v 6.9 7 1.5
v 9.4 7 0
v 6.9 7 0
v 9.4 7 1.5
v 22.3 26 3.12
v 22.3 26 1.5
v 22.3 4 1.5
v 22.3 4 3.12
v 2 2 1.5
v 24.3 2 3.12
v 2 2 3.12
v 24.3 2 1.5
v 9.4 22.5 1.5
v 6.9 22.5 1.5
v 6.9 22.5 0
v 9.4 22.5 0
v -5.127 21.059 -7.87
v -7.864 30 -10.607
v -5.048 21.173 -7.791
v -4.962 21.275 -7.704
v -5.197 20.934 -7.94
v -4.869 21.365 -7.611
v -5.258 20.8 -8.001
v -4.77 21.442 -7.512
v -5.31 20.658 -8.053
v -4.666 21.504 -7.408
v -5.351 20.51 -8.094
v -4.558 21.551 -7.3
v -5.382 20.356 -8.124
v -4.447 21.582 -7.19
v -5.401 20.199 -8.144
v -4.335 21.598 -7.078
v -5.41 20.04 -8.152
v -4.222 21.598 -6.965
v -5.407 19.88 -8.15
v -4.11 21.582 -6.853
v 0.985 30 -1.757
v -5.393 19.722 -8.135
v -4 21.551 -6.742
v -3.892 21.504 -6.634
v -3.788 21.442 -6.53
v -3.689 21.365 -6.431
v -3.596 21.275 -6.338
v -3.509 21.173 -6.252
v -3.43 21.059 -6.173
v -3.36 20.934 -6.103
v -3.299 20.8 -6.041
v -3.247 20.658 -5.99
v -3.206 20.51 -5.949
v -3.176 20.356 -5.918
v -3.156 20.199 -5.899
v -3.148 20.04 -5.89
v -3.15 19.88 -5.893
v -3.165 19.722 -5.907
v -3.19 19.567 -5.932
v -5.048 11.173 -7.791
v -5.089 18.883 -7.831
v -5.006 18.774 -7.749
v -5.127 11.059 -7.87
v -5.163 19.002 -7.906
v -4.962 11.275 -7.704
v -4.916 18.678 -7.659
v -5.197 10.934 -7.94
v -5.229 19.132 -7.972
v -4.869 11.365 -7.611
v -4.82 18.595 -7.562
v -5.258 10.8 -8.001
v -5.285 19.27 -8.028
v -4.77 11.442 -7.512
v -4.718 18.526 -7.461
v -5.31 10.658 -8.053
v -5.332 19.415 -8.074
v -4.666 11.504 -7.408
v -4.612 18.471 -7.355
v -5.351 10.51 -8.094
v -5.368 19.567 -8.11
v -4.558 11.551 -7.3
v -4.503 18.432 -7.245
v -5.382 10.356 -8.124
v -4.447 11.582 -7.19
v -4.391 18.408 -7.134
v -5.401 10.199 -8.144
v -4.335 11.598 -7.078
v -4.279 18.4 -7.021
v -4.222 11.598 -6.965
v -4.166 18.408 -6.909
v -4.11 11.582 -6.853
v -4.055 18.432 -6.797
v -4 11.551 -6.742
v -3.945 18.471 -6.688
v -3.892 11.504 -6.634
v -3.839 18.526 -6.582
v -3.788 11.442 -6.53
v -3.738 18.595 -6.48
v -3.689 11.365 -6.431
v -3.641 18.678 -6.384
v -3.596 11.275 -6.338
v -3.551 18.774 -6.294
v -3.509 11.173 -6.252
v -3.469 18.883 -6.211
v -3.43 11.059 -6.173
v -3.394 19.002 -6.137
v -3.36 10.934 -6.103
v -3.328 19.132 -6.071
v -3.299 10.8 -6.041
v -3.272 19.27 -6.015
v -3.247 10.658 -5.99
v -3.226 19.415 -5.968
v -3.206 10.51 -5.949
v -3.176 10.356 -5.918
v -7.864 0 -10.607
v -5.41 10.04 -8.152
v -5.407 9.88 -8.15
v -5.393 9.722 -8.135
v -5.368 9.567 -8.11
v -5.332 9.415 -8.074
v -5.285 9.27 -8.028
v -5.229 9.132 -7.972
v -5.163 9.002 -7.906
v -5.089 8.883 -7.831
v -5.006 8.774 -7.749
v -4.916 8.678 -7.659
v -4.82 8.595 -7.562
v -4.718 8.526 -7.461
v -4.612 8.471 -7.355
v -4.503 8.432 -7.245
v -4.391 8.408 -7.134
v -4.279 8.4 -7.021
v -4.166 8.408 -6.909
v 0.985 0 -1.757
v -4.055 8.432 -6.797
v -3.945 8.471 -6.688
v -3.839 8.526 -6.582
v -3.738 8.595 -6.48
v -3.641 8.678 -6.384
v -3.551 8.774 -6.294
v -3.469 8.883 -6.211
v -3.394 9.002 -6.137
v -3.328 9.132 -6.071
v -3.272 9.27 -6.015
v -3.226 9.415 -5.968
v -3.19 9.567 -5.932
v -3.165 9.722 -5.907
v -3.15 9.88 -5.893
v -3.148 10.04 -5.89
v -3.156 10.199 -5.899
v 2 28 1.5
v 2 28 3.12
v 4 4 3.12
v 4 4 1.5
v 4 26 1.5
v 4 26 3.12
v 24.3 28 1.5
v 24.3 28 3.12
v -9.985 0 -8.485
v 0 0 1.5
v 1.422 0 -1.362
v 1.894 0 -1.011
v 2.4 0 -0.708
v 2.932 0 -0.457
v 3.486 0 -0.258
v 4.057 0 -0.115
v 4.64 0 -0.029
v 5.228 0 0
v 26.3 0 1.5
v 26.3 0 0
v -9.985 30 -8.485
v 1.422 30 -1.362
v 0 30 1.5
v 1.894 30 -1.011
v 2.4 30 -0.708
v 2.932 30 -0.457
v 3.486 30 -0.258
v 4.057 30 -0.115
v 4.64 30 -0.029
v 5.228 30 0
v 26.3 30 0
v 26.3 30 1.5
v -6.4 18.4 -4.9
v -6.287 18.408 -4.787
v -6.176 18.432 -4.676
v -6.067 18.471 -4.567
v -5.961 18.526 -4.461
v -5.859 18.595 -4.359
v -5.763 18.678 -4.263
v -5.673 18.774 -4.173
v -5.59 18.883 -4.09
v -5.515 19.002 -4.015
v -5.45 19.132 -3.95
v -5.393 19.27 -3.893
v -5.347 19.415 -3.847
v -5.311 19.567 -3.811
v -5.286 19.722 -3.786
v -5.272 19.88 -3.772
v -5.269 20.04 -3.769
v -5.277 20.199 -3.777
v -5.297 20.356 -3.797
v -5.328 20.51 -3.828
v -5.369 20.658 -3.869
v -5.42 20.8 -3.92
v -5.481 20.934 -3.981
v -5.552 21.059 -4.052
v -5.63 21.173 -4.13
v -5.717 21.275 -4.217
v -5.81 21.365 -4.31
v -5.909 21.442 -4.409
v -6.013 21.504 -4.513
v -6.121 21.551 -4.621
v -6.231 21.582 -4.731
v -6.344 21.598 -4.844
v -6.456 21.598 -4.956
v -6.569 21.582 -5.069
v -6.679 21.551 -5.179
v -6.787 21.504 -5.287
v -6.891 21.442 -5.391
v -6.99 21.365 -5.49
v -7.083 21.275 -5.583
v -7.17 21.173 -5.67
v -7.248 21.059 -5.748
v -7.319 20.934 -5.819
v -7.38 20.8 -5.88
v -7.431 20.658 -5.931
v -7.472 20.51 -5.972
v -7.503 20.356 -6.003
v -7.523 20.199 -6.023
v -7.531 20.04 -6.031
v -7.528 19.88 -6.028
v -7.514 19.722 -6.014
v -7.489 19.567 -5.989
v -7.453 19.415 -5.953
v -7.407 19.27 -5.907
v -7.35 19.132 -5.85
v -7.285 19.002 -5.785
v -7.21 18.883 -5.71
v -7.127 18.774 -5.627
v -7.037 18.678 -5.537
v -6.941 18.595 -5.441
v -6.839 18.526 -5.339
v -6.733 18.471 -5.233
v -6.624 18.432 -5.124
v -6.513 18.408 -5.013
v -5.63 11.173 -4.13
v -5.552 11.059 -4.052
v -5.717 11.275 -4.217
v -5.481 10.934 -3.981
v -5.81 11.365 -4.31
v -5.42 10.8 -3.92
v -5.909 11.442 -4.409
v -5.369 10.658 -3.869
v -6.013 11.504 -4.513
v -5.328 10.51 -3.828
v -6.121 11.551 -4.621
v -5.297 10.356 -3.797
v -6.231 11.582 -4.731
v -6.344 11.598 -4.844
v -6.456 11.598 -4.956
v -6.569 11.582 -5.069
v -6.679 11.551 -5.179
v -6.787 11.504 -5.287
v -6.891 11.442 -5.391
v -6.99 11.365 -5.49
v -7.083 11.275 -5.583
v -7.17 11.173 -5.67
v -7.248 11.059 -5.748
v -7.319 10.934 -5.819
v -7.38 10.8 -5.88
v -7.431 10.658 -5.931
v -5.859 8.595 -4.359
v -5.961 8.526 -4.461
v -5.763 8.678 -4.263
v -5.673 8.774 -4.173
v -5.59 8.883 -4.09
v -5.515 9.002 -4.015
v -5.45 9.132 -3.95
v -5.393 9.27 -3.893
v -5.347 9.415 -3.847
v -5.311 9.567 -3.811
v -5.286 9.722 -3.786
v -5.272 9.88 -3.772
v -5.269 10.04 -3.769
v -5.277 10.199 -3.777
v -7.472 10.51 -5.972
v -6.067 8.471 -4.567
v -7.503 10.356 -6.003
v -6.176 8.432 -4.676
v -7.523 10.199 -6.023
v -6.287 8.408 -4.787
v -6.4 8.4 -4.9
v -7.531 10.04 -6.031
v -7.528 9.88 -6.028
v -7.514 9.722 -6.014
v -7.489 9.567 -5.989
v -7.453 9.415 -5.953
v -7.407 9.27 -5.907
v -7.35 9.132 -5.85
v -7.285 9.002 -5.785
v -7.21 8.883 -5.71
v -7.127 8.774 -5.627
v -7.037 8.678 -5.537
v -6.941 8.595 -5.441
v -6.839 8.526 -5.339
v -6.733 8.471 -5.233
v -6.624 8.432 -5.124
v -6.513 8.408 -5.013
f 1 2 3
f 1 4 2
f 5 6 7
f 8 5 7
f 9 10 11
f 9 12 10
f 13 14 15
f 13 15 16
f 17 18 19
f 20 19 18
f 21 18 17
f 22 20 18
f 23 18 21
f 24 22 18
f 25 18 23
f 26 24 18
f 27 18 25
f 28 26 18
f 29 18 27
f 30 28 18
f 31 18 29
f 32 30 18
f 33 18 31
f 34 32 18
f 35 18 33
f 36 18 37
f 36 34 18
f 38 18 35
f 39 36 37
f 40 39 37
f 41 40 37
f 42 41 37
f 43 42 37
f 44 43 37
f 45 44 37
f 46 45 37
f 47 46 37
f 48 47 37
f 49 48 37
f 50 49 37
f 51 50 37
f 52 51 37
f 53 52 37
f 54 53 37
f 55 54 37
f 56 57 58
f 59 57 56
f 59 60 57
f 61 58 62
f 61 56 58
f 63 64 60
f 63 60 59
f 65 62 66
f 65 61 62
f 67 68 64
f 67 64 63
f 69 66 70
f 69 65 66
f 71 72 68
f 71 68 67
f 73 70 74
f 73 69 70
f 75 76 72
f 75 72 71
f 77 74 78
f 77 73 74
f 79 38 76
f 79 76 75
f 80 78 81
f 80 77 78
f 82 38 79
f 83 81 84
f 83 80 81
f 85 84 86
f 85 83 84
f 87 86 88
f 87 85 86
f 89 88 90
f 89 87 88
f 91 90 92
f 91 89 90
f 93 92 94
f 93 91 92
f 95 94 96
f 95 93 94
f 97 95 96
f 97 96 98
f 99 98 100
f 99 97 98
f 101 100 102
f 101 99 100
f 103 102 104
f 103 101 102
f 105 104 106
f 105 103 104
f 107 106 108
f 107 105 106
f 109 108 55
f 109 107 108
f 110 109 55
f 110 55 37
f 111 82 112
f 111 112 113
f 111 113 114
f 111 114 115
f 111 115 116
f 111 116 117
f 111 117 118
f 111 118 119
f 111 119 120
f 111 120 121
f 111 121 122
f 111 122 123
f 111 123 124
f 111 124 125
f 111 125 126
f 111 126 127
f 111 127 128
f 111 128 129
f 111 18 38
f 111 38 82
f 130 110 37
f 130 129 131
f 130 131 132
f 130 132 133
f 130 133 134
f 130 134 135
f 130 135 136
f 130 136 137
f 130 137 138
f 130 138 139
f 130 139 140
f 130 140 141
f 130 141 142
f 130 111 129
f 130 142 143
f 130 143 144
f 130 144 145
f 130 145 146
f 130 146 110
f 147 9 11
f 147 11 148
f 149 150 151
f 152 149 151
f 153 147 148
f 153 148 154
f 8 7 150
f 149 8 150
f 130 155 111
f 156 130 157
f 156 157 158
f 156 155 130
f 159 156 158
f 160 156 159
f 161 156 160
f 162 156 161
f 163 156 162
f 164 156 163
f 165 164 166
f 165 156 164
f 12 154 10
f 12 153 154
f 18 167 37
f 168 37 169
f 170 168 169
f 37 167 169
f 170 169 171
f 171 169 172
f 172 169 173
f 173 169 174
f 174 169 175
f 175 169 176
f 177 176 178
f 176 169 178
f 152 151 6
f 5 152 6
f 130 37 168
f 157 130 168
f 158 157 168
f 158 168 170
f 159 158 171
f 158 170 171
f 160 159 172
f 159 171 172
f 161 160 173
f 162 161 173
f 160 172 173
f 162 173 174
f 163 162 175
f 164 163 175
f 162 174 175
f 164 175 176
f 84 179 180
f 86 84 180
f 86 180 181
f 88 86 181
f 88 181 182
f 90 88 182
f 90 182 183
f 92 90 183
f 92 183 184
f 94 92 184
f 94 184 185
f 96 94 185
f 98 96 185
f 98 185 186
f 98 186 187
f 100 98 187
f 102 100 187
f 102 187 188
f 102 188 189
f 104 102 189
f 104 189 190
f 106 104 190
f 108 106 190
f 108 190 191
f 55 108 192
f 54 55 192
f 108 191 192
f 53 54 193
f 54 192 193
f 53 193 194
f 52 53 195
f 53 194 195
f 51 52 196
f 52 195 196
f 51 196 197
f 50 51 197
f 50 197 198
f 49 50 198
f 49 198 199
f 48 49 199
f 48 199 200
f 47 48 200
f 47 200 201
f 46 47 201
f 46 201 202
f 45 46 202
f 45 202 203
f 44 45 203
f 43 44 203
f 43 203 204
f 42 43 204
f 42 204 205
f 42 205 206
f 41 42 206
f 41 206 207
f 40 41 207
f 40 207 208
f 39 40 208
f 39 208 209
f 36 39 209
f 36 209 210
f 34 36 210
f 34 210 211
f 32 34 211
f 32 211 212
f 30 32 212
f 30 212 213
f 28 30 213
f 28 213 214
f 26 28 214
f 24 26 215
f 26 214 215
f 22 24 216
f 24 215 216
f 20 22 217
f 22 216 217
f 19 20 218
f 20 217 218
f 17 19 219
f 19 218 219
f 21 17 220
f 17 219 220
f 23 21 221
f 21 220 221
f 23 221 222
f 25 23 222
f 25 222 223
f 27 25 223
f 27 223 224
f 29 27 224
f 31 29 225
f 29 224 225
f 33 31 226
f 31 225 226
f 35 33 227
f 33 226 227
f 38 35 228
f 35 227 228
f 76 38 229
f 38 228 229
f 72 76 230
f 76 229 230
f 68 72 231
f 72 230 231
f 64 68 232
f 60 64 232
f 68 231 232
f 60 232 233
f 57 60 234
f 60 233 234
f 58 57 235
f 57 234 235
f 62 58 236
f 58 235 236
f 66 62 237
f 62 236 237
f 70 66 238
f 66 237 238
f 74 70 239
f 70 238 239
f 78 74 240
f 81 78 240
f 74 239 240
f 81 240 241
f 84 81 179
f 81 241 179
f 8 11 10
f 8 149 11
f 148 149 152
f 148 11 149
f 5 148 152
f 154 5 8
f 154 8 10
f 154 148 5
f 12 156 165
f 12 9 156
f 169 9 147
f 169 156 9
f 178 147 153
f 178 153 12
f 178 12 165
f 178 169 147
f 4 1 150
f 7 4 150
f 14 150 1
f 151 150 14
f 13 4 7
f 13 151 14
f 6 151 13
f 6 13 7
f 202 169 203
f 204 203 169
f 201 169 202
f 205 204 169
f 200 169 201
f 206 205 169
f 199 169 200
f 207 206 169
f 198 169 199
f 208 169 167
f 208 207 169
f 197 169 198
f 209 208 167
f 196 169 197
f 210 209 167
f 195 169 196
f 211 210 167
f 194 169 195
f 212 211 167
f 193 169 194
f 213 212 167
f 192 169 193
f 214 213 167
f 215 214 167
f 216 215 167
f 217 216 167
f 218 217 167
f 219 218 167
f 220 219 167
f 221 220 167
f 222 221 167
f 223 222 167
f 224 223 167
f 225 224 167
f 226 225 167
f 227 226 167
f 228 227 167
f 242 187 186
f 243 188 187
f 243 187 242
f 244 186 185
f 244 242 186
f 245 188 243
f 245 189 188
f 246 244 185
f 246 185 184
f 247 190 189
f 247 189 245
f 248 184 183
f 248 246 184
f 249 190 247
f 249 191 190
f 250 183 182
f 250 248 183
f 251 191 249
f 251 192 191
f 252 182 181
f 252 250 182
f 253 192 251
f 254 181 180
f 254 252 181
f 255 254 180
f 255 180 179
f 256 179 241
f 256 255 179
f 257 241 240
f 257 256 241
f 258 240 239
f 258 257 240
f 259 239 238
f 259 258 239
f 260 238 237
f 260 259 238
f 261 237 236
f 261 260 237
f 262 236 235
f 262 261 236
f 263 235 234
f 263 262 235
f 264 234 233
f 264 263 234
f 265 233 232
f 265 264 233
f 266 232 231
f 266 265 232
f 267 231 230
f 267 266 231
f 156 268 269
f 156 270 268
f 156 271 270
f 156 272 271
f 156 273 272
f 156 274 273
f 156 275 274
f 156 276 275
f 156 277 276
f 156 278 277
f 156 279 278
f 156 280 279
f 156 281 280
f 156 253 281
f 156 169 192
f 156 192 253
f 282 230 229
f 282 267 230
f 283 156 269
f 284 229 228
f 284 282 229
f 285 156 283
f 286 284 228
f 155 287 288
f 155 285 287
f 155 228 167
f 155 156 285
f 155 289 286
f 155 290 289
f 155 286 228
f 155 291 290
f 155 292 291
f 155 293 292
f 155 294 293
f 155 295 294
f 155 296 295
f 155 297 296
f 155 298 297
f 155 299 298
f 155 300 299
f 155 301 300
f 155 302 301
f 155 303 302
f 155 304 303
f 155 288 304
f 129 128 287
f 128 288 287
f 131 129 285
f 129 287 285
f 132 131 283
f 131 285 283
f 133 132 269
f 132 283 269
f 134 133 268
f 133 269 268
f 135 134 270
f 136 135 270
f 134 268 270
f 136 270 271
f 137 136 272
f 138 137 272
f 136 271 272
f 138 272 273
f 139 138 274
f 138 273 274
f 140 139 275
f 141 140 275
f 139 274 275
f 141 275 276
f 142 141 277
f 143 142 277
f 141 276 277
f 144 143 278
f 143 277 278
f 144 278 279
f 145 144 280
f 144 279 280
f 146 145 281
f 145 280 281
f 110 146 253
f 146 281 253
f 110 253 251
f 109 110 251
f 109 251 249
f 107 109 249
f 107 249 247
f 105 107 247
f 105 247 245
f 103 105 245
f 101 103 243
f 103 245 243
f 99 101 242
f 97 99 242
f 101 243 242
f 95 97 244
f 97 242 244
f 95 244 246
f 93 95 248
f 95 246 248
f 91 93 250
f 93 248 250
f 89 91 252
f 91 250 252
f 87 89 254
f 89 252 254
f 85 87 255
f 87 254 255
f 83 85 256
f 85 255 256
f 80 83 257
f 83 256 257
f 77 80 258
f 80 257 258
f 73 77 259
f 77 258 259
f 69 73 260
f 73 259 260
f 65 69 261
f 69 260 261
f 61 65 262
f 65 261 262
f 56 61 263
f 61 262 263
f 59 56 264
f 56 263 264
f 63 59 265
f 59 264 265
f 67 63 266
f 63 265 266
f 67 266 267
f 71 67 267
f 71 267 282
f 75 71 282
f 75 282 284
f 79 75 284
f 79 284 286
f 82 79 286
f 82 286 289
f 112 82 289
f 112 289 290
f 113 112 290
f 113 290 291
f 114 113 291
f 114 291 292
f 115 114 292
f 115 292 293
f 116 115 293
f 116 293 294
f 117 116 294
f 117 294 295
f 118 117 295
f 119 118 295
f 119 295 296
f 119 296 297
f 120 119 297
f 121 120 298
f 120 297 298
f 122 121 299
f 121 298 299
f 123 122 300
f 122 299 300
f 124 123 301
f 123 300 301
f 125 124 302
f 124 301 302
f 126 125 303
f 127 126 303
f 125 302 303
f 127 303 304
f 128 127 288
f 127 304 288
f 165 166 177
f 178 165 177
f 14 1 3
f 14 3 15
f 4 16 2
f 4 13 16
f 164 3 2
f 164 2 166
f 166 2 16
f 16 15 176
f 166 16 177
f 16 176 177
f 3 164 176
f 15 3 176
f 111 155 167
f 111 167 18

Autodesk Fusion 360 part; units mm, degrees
sketch "Sketch1" plane through (0, 0, 0) normal (0, 0, 1) x (1, 0, 0)
  line L0 (0, 0) -> (26.3, 0)
  line L1 (26.3, 0) -> (26.3, 30)
  line L2 (26.3, 30) -> (0, 30)
  line L3 (0, 30) -> (0, 0)
  line L4 (2, 28) -> (24.3, 28)
  line L5 (24.3, 28) -> (24.3, 2)
  line L6 (24.3, 2) -> (2, 2)
  line L7 (2, 2) -> (2, 28)
  line L8 (4, 26) -> (22.3, 26)
  line L9 (22.3, 26) -> (22.3, 4)
  line L10 (22.3, 4) -> (4, 4)
  line L11 (4, 4) -> (4, 26)
  dimension "d1" = 26.3
  dimension "d2" = 30
  dimension "d3" = 2
  dimension "d4" = 2
  dimension "d5" = 2
  dimension "d6" = 2
  dimension "d7" = 2
  dimension "d8" = 2
  dimension "d9" = 2
  dimension "d10" = 2
  dimension "d45" = 17.3
extrude "Extrude2" add sketch "Sketch1" along normal blind 1.5 makes body 1 at (10.1, 18.6667, 0) makes body 2 at (25.6333, 10.6667, 0)
extrude "Extrude1" add sketch "Sketch1" along normal blind 3.12 contours L4 L5 L6 L7 bodies 1 2
sketch "Sketch2" plane through (0, 0, 1.5) normal (0, 0, 1) x (-1, 0, 0)
  line L0 (-6.9, -22.5) -> (-9.4, -22.5)
  line L1 (-9.4, -22.5) -> (-9.4, -7)
  line L2 (-9.4, -7) -> (-6.9, -7)
  line L3 (-6.9, -7) -> (-6.9, -22.5)
  line L4 (-4, -4) -> (-22.3, -4)
  line L5 (-22.3, -4) -> (-22.3, -26)
  line L6 (-22.3, -26) -> (-4, -26)
  line L7 (-4, -26) -> (-4, -4)
  line L8 (-24.3, -2) -> (-2, -2)
  line L9 (-2, -2) -> (-2, -28)
  line L10 (-2, -28) -> (-24.3, -28)
  line L11 (-24.3, -28) -> (-24.3, -2)
  line L12 (0, -30) -> (0, 0)
  line L13 (0, 0) -> (-26.3, 0)
  line L14 (-26.3, 0) -> (-26.3, -30)
  line L15 (-26.3, -30) -> (0, -30)
  line L16 (-4.4, -23) -> (-4.4, -7)
  dimension "d15" = 15.5
  dimension "d16" = 2.5
  dimension "d39" = 2.9
  dimension "d40" = 6.9
  dimension "d41" = 4.9
  dimension "d43" = 4.4
  dimension "d44" = 2.5
extrude "Extrude3" cut sketch "Sketch2" against normal blind 3 contours L0 L1 L2 L3 bodies 1
sketch "Sketch3" plane through (0, 0, 0) normal (0, -1, 0) x (1, 0, 0)
  line L0 (0, 0) -> (26.3, 0)
  line L1 (26.3, 0) -> (26.3, 1.5)
  line L2 (26.3, 1.5) -> (0, 1.5)
  line L3 (0, 1.5) -> (0, 0)
  line L4 (0, 1.5) -> (-9.9853, -8.4853)
  line L5 (-9.9853, -8.4853) -> (-7.864, -10.6066)
  line L6 (-7.864, -10.6066) -> (2.7426, 0)
  dimension "d21" = 3
  dimension "d32" = 15
  dimension "d35" = 135
extrude "Extrude4" add sketch "Sketch3" against normal blind 30 contours L0 L3 L4 L5 L6 bodies 1
sketch "Sketch4" plane through (-0.75, 0, 0.75) normal (-0.7071, 0, 0.7071) x (0, -1, 0)
  line L0 (0, -13.0607) -> (0, 1.0607)
  line L1 (0, 1.0607) -> (-30, 1.0607)
  line L2 (-30, 1.0607) -> (-30, -13.0607)
  line L3 (-30, -13.0607) -> (0, -13.0607)
  circle A0 centre (-20, -7.9903) radius 1.6
  circle A1 centre (-10, -7.9903) radius 1.6
  dimension "d24" = 3.2
  dimension "d25" = 3.2
  dimension "d26" = 10
  dimension "d27" = 10
  dimension "d29" = 9.051
extrude "Extrude5" cut sketch "Sketch4" against normal blind 5 contours A0 | A1 bodies 1
fillet "Fillet2" radius 6 1 edges at (2.7426, 15, 0) on bodies 1
component "Component" placed x (1, 0, 0) y (0, 1, 0) z (0, 0, 1) at (0, 0, 0)
equation "d4 = d3"
equation "d5 = d3"
equation "d6 = d3"
equation "d8 = d7"
equation "d9 = d7"
equation "d10 = d7"
equation "d11 = 1.5 mm + 1.62 mm"
equation "d25 = d24"
equation "d27 = ( 30 mm - d26 ) / 2"
equation "d29 = Linear Dimension-4"
equation "d35 = Angular Dimension-2"
